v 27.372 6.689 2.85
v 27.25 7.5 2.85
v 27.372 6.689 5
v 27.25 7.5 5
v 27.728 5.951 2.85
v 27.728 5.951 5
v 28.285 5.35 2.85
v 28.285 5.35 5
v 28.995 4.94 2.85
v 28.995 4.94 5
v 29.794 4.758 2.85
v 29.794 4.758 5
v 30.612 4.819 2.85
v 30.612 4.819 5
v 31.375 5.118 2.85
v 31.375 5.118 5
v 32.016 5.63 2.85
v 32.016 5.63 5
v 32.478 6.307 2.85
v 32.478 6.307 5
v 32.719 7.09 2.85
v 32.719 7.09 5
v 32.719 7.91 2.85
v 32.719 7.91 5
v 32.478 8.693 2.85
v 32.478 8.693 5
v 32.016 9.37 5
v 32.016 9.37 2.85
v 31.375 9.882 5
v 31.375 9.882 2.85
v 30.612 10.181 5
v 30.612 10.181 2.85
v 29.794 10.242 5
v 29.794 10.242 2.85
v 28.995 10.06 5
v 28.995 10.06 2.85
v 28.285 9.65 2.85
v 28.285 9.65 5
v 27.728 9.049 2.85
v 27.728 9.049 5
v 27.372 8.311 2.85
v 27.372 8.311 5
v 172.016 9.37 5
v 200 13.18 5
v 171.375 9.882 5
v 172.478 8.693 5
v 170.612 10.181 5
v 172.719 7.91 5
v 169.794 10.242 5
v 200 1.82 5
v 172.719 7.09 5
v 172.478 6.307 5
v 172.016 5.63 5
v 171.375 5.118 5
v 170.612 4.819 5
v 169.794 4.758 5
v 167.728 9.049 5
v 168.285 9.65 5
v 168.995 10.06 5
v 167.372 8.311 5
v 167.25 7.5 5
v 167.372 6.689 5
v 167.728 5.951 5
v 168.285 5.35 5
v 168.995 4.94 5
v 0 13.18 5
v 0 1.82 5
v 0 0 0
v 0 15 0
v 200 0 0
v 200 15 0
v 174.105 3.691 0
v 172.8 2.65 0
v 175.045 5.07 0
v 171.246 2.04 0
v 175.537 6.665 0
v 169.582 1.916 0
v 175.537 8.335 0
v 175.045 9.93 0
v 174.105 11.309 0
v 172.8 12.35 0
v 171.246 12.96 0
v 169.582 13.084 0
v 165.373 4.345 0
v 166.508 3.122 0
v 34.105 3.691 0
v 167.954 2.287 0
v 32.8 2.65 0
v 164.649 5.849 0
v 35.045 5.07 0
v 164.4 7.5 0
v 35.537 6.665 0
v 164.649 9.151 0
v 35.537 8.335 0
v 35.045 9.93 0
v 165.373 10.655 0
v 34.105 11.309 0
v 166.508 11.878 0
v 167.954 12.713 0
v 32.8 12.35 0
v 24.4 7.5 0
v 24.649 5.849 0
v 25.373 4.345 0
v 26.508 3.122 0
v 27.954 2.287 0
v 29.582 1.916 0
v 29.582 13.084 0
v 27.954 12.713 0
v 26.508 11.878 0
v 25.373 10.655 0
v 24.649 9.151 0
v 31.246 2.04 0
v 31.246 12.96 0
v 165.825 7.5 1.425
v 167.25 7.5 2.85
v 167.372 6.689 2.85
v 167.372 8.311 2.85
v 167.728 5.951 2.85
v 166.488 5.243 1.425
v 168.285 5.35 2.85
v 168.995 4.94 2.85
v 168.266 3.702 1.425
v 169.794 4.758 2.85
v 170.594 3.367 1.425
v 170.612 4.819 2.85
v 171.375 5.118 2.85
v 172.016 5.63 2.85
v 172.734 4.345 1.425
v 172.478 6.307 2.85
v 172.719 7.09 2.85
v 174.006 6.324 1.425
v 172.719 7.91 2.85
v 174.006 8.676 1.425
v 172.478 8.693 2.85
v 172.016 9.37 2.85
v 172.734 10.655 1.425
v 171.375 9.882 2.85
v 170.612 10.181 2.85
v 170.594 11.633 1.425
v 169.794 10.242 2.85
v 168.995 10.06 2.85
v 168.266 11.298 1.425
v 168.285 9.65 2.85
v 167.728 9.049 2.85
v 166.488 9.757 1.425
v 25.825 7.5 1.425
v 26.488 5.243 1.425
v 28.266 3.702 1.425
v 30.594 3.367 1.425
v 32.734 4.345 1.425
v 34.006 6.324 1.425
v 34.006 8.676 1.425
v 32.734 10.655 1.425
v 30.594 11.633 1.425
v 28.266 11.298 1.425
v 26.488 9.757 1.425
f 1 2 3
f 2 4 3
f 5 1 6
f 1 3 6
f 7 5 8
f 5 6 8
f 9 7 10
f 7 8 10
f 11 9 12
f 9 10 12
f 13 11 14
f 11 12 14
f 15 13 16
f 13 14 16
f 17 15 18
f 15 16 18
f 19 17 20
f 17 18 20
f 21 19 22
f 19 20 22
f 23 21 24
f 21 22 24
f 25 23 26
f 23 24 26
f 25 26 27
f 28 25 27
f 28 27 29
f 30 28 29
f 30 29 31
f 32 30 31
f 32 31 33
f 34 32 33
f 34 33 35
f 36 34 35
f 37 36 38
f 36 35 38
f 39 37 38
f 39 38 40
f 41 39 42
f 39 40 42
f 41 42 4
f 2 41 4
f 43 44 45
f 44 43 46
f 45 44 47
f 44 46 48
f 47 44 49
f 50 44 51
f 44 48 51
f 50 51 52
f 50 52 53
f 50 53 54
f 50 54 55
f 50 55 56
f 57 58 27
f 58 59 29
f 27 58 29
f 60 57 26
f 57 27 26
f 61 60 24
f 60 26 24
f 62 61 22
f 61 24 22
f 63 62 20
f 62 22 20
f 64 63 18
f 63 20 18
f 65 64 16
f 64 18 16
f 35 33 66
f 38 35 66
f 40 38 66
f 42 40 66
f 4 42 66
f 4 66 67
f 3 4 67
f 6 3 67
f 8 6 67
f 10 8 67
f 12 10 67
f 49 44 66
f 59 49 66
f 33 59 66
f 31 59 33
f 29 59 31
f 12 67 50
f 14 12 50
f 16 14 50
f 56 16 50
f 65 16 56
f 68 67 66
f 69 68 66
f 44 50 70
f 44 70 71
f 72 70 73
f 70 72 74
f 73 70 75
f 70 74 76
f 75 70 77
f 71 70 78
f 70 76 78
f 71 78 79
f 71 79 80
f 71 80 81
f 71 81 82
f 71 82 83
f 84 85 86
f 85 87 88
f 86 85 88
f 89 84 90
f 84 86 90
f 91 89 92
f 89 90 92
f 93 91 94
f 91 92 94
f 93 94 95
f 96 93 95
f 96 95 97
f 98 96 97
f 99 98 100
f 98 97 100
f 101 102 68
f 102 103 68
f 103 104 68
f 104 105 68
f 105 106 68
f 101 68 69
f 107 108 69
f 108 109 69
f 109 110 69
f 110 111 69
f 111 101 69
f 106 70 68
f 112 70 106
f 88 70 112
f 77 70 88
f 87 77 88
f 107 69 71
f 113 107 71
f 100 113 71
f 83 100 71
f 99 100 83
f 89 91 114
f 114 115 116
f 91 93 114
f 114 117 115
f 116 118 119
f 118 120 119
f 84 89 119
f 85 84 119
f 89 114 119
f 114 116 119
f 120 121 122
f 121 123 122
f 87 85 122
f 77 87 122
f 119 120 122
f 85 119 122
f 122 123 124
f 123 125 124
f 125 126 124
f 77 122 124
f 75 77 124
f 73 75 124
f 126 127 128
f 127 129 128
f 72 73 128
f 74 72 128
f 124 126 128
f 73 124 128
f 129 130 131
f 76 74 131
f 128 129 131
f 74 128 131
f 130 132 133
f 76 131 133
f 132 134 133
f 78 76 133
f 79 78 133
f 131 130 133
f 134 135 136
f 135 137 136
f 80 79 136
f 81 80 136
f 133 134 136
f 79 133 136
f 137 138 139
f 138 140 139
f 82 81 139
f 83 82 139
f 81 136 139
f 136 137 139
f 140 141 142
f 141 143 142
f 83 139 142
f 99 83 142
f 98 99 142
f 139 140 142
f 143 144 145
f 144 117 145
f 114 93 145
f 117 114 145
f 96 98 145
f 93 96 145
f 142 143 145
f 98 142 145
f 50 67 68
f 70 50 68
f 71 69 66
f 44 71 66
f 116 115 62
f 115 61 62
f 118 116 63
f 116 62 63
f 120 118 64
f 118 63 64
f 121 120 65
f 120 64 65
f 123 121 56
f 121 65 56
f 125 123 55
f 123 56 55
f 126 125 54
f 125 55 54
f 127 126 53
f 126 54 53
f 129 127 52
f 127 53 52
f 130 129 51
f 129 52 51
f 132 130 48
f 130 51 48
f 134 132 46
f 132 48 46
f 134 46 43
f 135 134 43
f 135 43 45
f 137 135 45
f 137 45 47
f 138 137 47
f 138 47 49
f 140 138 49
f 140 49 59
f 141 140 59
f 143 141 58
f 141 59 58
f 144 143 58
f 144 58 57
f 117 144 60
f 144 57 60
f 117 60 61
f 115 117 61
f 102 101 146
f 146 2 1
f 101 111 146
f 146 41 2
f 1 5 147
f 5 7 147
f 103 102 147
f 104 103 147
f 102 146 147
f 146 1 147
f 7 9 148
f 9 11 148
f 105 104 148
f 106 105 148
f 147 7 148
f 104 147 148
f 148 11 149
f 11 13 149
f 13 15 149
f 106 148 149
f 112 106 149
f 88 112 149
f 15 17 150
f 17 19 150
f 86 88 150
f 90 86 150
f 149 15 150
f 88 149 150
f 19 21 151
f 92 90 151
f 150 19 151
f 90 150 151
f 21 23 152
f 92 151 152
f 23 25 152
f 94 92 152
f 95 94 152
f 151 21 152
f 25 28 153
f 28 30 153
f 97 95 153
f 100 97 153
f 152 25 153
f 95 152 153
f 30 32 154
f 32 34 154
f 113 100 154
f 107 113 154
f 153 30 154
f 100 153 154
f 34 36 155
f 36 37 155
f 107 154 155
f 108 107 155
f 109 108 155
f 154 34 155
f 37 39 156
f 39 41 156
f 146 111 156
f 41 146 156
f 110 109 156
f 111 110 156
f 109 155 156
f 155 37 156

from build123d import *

# Parameters (mm, degrees)
F1_DEPTH       = 200
F3_D           = 5.5
F3_CSINK_D     = 11.2
F3_CSINK_ANGLE = 90


with BuildPart() as f1:
    # F0 (on Right) → F1 (new body)
    with BuildSketch(Plane.YZ):
        Polygon((1.8198511713, 5), (0, 0), (15, 0), (13.1801488287, 5), align=None)
    extrude(amount=F1_DEPTH)

    # F3 (through all)
    with Locations(Plane(origin=(0, 0, 0), x_dir=(1, 0, 0), z_dir=(0, 0, -1))):
        with Locations((30, -7.5), (170, -7.5)):
            CounterSinkHole(F3_D / 2, F3_CSINK_D / 2, counter_sink_angle=F3_CSINK_ANGLE)


solid = f1.part
